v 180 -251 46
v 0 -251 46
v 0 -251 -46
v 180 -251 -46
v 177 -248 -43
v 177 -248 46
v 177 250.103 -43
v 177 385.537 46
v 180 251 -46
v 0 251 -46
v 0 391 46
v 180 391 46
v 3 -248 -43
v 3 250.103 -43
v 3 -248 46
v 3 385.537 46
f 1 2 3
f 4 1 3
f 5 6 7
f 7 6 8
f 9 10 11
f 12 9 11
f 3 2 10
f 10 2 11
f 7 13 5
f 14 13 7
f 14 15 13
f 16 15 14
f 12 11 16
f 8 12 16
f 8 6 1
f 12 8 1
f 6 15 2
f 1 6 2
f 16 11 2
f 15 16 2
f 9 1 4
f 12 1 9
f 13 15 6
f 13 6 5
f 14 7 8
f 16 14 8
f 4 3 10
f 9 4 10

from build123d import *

# Parameters (mm, degrees)
F1_DEPTH = 180
F2_T     = -3


with BuildPart() as f1:
    # F0 (on Right) → F1 (new body)
    with BuildSketch(Plane.YZ):
        Polygon((-251, 46), (-251, -46), (251, -46), (391, 46), (251, 46), align=None)
    extrude(amount=F1_DEPTH)

    # F2
    f2_openings = [f1.faces().sort_by_distance(p)[0] for p in [
        (90, 70, 46),
    ]]
    offset(amount=F2_T, openings=f2_openings)


solid = f1.part
